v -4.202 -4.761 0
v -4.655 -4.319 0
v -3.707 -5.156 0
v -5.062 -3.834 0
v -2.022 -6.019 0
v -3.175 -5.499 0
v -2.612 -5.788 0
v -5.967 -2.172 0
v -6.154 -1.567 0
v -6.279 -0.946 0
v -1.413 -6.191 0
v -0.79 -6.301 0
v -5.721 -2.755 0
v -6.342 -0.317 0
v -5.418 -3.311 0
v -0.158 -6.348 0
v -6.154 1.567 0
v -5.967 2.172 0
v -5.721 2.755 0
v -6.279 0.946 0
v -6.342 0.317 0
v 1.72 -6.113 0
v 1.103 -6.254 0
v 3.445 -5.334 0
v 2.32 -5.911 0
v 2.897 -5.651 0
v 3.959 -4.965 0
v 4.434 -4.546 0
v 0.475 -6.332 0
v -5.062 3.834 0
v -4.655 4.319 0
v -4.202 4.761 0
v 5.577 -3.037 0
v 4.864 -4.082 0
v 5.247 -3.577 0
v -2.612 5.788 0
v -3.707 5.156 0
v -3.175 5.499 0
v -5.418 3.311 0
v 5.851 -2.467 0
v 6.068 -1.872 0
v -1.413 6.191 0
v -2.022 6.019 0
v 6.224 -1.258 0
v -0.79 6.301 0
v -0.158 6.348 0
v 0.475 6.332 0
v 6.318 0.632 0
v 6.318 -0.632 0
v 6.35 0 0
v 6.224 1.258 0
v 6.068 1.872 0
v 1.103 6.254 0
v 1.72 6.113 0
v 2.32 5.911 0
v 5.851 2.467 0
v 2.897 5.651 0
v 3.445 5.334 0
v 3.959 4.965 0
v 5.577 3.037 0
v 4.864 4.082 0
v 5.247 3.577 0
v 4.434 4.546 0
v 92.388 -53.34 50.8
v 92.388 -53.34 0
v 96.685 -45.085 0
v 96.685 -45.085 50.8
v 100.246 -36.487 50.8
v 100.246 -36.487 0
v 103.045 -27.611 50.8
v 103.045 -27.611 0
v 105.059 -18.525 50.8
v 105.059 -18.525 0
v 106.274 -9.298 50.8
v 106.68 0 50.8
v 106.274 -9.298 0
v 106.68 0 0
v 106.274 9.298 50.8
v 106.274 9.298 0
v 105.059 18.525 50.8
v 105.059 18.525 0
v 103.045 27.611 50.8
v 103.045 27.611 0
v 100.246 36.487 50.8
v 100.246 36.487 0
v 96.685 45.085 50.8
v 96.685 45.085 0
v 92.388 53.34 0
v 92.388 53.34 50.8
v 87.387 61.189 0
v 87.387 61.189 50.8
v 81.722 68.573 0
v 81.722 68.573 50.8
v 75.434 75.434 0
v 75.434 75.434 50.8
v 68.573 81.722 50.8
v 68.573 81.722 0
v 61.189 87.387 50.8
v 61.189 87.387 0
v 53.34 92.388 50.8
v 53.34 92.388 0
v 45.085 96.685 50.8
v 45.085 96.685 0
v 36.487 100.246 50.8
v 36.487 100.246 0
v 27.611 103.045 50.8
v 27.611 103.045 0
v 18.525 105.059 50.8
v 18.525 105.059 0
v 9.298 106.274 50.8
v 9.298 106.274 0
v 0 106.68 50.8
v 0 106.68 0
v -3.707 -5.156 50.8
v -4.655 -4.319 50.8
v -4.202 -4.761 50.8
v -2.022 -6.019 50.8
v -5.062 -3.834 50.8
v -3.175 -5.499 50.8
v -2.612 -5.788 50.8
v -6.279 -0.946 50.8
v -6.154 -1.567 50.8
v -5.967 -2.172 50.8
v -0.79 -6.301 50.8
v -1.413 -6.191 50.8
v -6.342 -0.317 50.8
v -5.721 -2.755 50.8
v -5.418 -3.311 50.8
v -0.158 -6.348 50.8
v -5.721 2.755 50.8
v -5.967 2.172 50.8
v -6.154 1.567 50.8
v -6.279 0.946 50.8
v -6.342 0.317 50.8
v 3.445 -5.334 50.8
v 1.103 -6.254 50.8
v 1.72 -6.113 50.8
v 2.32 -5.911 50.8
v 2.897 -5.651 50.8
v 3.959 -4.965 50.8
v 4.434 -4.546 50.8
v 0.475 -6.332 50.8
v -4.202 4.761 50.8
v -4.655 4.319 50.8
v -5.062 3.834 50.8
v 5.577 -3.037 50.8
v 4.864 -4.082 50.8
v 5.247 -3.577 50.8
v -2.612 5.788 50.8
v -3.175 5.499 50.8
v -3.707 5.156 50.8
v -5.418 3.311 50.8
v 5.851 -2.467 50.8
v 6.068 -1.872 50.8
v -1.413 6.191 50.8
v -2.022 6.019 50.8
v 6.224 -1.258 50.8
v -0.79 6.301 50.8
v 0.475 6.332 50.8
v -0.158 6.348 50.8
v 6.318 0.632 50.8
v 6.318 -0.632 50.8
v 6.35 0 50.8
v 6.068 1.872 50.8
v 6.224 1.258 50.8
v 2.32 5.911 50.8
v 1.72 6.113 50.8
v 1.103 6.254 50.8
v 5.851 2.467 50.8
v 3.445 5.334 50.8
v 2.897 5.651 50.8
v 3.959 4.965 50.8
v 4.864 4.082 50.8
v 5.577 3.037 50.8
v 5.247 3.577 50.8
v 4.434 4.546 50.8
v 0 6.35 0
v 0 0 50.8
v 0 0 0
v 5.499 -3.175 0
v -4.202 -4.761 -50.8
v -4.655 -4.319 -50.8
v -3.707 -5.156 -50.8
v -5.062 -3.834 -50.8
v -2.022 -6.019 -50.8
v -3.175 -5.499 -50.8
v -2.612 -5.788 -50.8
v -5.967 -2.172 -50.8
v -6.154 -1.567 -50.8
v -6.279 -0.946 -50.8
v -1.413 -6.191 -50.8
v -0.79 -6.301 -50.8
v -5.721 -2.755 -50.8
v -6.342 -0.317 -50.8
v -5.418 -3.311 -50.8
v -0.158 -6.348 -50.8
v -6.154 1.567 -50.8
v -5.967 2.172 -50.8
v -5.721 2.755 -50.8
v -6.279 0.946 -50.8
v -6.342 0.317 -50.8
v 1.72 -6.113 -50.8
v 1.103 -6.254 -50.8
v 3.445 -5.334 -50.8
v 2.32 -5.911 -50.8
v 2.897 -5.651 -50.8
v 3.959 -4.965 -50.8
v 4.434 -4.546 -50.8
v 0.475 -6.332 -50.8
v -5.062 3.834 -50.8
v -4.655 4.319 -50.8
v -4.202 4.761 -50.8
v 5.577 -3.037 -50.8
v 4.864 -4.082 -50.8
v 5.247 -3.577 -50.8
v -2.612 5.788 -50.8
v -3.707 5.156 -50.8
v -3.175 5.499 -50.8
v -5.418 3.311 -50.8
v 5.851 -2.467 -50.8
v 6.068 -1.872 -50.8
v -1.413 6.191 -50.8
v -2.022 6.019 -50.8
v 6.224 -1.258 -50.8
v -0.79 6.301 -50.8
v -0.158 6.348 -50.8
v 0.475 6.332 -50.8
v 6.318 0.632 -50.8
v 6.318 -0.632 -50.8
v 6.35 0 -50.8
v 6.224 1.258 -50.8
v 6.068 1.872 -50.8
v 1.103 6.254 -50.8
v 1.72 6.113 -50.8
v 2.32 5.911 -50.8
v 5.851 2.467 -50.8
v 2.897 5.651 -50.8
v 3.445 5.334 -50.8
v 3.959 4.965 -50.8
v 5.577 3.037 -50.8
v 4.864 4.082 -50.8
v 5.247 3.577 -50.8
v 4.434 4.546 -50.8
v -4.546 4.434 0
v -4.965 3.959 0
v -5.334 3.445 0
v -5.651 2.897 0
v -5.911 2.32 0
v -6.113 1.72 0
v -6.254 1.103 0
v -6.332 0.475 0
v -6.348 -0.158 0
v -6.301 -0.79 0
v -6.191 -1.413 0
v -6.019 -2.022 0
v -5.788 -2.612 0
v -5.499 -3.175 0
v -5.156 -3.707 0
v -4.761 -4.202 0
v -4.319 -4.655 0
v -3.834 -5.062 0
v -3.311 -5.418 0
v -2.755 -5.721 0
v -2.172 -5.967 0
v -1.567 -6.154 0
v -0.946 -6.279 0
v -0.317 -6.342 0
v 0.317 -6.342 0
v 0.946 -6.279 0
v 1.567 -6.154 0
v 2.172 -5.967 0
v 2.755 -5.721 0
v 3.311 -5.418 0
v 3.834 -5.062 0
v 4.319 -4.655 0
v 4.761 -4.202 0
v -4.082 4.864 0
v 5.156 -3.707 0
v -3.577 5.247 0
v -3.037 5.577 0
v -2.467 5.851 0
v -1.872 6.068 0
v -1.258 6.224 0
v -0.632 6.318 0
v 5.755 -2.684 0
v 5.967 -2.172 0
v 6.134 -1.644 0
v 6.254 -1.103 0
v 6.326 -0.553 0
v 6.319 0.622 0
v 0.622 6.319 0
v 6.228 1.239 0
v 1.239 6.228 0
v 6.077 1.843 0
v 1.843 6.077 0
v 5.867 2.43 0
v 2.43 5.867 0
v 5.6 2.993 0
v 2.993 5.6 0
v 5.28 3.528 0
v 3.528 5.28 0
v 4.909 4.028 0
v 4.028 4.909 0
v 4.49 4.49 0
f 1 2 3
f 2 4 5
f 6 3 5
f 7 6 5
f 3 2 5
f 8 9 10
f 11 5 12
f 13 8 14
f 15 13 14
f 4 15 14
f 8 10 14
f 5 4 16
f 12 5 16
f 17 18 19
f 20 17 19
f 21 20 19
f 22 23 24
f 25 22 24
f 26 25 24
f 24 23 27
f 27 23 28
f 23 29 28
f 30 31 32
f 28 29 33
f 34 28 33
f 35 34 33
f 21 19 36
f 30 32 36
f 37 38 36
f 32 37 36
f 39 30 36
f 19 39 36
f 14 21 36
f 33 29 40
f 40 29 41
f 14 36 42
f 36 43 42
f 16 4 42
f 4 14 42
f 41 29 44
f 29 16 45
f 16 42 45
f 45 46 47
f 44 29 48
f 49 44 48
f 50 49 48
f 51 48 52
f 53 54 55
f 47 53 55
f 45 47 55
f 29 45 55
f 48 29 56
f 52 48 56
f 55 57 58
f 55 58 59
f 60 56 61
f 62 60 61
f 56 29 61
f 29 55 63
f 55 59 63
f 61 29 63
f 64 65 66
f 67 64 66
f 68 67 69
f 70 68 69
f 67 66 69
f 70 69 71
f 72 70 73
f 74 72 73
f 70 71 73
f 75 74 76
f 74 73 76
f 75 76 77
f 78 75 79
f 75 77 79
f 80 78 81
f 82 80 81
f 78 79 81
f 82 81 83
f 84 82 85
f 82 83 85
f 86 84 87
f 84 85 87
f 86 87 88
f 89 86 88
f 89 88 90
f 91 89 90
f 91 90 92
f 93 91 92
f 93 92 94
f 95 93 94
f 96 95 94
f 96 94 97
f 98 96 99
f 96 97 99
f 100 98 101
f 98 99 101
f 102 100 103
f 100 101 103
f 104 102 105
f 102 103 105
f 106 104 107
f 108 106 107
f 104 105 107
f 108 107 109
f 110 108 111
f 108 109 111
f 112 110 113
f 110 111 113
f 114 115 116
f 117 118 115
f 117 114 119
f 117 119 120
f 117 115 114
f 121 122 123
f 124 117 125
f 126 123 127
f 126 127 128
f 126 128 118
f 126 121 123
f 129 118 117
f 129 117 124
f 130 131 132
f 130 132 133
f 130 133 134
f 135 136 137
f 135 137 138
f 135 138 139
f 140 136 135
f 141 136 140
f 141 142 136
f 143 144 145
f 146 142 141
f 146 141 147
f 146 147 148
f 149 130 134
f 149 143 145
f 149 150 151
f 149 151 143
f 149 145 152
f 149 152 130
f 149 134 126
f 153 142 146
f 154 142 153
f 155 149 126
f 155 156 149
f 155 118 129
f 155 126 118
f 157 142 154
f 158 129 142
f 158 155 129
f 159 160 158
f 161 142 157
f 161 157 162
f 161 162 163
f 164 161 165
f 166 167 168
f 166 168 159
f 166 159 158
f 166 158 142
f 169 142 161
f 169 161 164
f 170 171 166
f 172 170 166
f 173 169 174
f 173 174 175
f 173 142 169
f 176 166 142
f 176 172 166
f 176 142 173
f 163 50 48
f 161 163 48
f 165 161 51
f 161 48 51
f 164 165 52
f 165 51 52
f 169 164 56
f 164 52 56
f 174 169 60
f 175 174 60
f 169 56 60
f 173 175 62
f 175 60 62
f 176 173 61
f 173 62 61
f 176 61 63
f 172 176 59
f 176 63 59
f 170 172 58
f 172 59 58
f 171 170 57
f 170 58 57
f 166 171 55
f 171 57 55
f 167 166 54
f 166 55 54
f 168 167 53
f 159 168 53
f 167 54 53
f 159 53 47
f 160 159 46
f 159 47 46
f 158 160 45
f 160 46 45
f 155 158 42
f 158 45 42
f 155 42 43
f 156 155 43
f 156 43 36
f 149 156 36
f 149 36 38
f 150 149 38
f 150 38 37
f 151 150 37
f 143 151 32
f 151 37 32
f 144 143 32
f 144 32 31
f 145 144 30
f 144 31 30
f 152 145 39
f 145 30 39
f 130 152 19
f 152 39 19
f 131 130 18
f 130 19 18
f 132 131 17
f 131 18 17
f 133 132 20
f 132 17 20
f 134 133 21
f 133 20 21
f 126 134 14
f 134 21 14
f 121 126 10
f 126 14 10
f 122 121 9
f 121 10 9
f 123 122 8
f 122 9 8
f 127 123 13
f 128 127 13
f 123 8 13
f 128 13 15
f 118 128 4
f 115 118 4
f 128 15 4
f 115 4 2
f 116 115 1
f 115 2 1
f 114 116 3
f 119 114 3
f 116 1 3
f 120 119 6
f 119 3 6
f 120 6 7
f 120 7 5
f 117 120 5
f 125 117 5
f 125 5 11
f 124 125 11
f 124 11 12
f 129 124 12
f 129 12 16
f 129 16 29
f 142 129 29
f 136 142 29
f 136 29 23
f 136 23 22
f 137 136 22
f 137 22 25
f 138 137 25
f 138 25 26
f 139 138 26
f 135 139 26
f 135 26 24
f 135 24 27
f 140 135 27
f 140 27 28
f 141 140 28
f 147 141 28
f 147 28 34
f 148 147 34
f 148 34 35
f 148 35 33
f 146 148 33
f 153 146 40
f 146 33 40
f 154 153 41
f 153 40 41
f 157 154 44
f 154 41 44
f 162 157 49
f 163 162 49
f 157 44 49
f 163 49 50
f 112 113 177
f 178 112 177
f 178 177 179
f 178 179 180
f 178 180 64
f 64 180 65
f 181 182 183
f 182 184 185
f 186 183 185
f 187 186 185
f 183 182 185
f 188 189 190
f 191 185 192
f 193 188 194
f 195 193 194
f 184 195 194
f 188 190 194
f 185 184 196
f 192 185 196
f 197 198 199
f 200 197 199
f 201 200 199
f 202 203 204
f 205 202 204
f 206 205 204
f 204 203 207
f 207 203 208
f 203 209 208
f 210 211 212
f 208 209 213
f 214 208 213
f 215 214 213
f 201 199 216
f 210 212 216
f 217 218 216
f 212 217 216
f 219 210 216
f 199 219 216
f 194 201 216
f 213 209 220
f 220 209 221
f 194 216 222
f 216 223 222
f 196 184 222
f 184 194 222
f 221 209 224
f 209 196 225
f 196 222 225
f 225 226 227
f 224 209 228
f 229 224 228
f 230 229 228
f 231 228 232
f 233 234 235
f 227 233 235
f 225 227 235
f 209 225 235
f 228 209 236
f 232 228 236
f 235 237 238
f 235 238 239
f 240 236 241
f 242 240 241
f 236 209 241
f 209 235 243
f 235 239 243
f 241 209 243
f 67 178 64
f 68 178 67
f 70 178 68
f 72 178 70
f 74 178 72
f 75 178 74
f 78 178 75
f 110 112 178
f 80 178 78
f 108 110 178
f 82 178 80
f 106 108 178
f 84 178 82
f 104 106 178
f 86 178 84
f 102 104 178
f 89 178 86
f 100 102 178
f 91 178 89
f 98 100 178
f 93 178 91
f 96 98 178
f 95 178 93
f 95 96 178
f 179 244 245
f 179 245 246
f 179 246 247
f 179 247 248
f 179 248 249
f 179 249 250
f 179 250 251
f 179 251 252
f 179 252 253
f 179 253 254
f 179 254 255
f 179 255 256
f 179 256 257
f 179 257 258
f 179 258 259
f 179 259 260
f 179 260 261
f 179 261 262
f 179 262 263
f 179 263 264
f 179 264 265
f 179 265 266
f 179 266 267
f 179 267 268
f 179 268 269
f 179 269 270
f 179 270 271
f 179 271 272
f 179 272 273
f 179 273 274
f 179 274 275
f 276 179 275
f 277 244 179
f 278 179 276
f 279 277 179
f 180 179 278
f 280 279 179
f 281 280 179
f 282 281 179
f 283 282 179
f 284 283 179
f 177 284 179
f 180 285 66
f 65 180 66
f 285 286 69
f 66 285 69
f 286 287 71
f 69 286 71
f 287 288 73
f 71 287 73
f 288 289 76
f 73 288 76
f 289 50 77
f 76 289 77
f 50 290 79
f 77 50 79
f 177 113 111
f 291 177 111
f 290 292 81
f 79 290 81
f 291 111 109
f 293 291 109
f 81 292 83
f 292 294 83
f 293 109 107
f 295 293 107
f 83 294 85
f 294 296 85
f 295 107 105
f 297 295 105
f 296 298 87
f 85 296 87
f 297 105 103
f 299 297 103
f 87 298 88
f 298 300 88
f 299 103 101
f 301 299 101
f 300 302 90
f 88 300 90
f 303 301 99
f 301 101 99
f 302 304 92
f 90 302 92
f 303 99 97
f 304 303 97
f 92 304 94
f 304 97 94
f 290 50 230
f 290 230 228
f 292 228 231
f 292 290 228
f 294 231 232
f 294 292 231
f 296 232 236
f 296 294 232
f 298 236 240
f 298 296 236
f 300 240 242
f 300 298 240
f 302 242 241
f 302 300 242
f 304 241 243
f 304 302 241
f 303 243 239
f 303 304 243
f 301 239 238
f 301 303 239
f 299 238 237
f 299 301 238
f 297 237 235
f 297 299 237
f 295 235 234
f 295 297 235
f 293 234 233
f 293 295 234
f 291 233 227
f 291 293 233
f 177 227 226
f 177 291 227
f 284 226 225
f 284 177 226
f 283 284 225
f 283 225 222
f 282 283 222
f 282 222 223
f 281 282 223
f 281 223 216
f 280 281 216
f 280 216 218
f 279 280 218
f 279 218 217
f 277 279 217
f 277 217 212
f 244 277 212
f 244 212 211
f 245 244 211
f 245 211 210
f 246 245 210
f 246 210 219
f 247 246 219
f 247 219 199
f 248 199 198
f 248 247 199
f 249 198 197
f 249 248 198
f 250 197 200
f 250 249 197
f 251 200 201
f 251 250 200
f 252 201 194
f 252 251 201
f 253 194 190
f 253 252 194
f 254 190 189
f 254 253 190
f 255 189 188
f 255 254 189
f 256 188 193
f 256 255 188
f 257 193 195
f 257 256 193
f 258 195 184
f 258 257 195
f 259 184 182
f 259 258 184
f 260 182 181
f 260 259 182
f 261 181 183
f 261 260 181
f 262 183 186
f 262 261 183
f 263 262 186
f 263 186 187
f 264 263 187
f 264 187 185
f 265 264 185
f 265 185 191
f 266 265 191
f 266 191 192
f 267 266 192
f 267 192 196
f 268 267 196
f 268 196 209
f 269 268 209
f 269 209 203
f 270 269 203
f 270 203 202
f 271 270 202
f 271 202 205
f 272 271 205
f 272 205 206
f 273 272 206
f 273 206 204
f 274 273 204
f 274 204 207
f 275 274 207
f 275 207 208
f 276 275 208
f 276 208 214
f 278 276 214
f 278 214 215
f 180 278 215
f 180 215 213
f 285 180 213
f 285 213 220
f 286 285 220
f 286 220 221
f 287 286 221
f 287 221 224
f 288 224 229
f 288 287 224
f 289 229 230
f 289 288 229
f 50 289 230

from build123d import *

# Parameters (mm, degrees)
F1_DEPTH = 50.8
F2_R     = 6.35
F3_DEPTH = 50.8
F4_DEPTH = 50.8


with BuildPart() as f1:
    # F0 (on Top) → F1 (new body)
    with BuildSketch(Plane.XY):
        with BuildLine():
            Line((0, 106.68), (0, 0))
            Line((0, 0), (92.3875900757, -53.34))
            ThreePointArc((92.3875900757, -53.34), (92.3875900757, 53.34), (0, 106.68))
        make_face()
    extrude(amount=F1_DEPTH)

    # F2 (on Top) → F4 (join)
    with BuildSketch(Plane.XY):
        Circle(F2_R)
    extrude(amount=-F4_DEPTH)


with BuildPart() as f3:
    # F2 (on Top) → F3 (new body)
    with BuildSketch(Plane.XY):
        Circle(F2_R)
    extrude(amount=F3_DEPTH)


solid = Compound([f1.part, f3.part])
